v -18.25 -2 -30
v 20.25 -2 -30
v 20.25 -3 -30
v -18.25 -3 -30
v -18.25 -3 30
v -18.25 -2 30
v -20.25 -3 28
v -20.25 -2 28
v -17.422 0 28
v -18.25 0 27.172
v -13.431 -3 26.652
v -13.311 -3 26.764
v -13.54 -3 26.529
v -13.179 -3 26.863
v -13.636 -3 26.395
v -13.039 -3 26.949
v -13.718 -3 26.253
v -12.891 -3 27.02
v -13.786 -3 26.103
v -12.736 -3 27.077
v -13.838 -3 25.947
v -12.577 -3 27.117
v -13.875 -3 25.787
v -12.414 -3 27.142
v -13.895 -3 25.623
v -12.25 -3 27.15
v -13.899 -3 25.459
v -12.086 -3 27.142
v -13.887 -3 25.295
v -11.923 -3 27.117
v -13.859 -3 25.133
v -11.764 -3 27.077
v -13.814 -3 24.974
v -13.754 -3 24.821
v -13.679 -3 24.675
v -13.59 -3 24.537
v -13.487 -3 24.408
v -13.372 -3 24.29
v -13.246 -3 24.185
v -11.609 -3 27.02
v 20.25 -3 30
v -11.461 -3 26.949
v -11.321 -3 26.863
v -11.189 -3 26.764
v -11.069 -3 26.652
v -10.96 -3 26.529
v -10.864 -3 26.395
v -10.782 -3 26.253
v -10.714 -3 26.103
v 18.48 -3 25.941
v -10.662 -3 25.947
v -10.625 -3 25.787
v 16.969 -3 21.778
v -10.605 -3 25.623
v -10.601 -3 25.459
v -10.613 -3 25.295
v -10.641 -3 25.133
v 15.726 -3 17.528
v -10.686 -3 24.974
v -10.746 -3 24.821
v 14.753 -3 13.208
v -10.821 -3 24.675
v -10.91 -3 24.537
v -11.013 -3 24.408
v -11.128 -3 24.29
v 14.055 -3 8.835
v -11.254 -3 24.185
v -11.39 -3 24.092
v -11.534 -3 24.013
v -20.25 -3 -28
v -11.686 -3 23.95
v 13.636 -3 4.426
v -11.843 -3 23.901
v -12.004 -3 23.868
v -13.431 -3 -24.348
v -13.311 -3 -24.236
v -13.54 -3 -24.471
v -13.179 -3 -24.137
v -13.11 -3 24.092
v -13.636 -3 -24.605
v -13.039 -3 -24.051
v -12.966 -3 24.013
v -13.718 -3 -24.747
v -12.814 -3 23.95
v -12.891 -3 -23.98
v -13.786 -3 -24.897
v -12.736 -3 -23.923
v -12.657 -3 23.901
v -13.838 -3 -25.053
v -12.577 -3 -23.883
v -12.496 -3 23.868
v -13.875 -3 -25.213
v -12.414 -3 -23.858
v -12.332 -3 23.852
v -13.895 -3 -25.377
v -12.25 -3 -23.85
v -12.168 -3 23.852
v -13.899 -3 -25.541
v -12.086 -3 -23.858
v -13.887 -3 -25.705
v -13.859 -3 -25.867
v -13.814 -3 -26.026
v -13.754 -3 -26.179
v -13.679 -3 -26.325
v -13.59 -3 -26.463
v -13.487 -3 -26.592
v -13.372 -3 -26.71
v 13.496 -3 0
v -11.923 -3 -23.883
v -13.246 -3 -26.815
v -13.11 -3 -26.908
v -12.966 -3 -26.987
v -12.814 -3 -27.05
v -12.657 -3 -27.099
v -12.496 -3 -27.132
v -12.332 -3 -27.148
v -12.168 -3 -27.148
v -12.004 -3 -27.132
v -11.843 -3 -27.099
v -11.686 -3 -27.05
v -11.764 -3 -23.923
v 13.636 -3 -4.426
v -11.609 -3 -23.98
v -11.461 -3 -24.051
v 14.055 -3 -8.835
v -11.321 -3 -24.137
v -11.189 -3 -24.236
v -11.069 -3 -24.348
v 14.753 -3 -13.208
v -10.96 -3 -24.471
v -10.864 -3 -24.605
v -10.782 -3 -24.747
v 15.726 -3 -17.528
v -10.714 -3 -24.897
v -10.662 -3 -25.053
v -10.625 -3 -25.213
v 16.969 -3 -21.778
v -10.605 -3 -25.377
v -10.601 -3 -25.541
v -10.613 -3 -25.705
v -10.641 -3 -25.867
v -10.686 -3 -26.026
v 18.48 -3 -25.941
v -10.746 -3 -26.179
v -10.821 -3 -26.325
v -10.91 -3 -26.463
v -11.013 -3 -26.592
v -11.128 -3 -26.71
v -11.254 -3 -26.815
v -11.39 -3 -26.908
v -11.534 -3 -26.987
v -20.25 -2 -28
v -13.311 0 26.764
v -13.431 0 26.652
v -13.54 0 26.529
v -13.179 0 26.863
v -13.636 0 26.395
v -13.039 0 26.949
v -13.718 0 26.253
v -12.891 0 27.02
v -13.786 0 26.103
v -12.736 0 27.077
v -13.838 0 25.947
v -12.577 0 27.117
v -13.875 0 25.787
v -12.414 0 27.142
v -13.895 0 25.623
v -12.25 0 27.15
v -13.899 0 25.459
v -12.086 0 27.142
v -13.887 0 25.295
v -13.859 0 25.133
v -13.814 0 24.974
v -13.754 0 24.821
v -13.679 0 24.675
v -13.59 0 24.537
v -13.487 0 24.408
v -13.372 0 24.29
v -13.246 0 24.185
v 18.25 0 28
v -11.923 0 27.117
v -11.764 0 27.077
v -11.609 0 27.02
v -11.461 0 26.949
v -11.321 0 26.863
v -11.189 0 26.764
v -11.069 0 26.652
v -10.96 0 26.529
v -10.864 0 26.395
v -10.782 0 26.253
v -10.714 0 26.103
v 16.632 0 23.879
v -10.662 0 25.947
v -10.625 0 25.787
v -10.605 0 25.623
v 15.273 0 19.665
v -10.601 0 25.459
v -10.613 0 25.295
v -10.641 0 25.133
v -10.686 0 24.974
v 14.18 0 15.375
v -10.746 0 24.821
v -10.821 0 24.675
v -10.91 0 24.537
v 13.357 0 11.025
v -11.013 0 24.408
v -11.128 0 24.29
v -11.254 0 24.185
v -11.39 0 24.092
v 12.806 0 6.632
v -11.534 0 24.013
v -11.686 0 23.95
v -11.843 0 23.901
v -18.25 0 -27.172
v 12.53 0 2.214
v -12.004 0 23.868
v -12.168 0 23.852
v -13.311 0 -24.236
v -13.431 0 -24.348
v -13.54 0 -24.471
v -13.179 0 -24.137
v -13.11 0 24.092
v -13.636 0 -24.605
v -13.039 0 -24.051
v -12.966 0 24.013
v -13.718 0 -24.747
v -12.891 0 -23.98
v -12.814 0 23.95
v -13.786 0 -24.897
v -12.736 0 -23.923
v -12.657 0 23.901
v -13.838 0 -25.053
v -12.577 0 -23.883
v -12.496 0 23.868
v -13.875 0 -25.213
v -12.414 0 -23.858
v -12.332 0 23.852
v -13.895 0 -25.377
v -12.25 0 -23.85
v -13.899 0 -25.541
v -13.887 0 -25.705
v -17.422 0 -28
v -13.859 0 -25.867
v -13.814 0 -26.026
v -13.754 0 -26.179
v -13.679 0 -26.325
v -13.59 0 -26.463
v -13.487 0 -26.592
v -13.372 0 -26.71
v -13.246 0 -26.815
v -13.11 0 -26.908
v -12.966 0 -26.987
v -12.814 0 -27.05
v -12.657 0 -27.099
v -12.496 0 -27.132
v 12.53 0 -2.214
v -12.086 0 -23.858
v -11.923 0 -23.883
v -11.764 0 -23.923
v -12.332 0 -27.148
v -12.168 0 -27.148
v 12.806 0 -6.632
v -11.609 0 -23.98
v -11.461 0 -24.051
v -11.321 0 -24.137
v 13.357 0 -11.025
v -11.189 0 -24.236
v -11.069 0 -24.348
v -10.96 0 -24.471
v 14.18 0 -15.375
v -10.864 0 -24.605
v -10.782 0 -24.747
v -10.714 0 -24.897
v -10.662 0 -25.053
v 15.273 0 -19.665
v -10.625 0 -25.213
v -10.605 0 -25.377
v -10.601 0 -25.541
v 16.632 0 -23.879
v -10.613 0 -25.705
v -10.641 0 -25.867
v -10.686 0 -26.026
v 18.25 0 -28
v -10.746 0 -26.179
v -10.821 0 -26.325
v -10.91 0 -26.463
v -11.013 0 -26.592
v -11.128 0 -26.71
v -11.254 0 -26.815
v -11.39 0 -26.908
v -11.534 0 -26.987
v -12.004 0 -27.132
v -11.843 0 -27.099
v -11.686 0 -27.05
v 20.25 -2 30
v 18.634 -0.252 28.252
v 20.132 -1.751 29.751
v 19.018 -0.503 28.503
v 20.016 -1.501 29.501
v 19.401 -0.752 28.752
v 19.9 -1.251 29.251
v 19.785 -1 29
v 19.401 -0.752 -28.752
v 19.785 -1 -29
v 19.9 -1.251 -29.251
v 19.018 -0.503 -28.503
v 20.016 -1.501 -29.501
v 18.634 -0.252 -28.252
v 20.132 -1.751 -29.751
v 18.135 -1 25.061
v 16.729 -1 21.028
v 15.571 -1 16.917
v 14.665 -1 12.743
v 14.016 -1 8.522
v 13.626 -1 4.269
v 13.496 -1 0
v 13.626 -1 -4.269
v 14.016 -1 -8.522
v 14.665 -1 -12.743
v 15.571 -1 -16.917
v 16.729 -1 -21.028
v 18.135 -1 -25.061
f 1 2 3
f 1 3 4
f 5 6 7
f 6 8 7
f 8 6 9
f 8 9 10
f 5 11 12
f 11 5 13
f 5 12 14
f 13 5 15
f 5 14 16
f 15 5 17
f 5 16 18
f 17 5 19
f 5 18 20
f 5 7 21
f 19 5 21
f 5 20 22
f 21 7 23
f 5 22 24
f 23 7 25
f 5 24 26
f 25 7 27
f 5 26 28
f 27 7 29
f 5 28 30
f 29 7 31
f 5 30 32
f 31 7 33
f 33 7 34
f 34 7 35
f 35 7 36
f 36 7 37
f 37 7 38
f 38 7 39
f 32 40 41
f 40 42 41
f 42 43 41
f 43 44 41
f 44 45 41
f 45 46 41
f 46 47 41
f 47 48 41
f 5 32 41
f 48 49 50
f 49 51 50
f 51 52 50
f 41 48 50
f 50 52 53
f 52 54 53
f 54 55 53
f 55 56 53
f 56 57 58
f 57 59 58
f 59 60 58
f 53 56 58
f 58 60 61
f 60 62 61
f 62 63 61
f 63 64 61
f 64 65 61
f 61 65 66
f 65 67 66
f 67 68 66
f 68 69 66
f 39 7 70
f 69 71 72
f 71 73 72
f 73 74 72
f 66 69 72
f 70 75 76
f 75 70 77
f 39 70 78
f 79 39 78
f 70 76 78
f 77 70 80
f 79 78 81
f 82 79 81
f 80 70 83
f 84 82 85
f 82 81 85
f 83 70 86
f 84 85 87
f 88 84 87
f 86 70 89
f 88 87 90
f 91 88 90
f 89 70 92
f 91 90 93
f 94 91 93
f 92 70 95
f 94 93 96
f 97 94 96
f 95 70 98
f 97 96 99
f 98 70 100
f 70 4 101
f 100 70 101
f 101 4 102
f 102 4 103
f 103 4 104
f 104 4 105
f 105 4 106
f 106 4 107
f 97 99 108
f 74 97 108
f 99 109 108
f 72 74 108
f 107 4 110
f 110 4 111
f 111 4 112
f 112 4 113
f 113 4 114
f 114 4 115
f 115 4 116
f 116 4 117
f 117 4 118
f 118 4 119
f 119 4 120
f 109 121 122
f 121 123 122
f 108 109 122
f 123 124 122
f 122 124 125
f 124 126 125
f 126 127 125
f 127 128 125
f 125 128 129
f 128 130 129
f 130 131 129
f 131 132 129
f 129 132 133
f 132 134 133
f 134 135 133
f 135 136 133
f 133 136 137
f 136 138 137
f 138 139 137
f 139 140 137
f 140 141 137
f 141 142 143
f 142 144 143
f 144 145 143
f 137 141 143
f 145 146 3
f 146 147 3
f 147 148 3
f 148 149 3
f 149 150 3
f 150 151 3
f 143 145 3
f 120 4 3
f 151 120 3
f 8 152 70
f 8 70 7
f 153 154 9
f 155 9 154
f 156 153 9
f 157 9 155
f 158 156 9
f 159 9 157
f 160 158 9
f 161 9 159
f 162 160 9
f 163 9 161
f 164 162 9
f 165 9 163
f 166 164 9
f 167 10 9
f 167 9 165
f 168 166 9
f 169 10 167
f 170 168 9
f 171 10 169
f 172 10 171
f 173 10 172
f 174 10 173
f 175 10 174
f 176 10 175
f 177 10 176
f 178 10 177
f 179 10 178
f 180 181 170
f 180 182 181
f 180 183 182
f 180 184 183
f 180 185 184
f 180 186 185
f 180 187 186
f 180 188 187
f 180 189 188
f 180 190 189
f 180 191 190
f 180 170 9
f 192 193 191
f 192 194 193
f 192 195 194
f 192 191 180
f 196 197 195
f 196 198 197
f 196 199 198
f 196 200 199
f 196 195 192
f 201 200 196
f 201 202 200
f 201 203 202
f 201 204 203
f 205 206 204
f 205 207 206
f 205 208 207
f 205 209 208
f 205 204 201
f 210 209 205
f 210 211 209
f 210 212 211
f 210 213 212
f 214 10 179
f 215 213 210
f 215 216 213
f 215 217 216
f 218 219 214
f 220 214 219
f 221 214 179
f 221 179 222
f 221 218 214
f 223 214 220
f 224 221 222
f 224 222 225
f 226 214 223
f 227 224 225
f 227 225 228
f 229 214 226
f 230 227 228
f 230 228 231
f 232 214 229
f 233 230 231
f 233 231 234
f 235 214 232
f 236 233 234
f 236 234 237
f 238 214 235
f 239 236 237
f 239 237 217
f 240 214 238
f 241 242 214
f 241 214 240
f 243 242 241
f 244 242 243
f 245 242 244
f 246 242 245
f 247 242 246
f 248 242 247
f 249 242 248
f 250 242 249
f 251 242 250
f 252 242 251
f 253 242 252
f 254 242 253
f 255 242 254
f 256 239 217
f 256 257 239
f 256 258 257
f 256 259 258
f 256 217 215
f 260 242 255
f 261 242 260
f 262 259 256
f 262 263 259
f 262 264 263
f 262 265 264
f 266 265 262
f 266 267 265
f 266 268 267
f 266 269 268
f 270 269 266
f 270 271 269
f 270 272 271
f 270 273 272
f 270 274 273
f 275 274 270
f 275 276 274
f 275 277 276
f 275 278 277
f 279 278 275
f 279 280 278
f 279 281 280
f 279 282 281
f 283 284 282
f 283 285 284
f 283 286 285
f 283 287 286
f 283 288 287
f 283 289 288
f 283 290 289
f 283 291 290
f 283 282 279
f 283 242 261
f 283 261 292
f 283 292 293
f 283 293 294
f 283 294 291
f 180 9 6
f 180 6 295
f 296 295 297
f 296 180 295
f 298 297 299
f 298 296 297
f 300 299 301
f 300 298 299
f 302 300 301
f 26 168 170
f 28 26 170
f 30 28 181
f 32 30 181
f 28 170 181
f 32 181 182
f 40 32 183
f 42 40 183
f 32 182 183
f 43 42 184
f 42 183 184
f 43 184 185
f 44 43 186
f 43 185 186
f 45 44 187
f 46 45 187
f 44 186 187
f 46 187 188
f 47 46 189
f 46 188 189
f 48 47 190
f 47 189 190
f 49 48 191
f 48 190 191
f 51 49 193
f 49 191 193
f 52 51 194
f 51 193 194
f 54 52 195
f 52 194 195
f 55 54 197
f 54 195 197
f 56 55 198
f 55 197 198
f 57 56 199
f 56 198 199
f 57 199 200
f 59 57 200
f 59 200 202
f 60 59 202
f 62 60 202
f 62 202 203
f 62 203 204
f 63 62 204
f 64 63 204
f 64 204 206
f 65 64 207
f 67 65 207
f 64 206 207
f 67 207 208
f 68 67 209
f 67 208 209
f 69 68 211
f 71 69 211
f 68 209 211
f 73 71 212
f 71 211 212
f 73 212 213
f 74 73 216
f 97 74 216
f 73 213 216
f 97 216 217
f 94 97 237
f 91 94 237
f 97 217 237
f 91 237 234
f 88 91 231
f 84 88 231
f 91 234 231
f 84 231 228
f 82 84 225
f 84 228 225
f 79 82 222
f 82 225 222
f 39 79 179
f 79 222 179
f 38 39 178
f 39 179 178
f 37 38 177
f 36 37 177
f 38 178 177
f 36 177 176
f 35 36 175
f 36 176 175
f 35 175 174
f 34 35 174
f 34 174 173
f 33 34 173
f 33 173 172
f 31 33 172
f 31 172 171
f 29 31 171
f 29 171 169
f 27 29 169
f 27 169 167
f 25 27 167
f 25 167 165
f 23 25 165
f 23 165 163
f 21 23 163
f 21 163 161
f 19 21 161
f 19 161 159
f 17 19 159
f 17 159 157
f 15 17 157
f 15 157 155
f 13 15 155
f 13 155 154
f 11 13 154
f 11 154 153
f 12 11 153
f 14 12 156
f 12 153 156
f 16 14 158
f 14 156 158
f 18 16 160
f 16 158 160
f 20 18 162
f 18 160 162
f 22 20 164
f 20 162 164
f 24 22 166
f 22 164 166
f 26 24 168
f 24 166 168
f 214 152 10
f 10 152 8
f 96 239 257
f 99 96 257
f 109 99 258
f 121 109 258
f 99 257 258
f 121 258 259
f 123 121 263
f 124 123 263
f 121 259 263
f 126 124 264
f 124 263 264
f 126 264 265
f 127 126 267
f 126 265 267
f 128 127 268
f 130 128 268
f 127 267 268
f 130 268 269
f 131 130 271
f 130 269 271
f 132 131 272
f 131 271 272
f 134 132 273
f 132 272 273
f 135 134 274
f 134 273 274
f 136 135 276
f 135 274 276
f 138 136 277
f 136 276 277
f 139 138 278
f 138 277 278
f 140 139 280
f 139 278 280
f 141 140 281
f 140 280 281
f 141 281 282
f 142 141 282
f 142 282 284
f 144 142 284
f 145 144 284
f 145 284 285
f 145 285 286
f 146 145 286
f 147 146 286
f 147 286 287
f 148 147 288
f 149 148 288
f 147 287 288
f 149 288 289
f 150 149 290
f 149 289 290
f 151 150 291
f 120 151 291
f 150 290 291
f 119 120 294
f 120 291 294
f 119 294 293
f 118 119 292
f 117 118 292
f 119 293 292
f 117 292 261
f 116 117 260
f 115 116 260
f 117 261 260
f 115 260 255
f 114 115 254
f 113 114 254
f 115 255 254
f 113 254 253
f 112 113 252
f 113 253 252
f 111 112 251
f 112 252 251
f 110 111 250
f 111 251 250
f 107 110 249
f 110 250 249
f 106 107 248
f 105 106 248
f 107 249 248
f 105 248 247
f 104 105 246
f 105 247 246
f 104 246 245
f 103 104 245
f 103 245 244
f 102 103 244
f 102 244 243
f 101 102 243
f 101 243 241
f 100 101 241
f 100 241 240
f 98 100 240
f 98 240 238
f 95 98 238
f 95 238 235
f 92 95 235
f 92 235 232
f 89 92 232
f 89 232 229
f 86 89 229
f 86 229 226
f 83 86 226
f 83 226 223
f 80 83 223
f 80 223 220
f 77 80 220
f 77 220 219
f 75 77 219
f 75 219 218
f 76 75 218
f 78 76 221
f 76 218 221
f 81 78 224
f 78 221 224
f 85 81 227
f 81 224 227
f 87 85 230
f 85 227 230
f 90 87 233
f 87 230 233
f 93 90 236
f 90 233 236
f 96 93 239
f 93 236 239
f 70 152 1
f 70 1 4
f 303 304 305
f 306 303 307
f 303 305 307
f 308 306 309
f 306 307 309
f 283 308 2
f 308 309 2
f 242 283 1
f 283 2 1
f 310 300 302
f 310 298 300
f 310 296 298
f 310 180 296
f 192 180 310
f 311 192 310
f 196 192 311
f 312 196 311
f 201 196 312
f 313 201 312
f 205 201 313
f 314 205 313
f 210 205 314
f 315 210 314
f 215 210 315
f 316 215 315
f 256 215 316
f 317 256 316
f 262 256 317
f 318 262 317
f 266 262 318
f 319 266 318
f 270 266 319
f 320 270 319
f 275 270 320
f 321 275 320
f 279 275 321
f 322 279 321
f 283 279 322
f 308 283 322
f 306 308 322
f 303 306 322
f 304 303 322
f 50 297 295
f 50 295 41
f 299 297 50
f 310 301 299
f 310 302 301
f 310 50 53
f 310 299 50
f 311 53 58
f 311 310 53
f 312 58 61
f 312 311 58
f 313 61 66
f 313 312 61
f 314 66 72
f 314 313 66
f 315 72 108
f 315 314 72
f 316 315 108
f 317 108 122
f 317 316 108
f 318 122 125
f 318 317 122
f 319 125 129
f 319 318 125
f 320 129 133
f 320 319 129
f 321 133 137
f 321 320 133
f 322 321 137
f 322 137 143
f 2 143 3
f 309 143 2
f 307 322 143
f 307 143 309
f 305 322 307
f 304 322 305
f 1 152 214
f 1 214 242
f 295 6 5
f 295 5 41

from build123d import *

# Parameters (mm, degrees)
ESQUISSE1_R        = 1.65
BOSS_EXTRU_1_DEPTH = 3
CHANFREIN1_SIZE    = 2
CHANFREIN3_SIZE    = 2
CHANFREIN4_SIZE    = 1


with BuildPart() as part:
    # Esquisse1 → Boss.-Extru.1 (new body)
    with BuildSketch(Plane(origin=(0, 0, 0), x_dir=(1, 0, 0), z_dir=(0, 1, 0))):
        with BuildLine():
            Line((-20.25, -30), (20.25, -30))
            ThreePointArc((20.25, -30), (13.495553203, 0), (20.25, 30))
            Line((20.25, 30), (-20.25, 30))
            Line((-20.25, 30), (-20.25, -30))
        make_face()
        with Locations(Location((-12.25, -25.5, 0), (0, 0, 270))):
            Circle(ESQUISSE1_R, mode=Mode.SUBTRACT)
        with Locations(Location((-12.25, 25.5, 0), (0, 0, 270))):
            Circle(ESQUISSE1_R, mode=Mode.SUBTRACT)
    extrude(amount=-BOSS_EXTRU_1_DEPTH)

    # Chanfrein1
    chanfrein1_edges = [part.edges().sort_by_distance(p)[0] for p in [
        (-20.25, -1.5, 30),
        (-20.25, -1.5, -30),
    ]]
    chamfer(chanfrein1_edges, length=CHANFREIN1_SIZE)

    # Chanfrein3
    chanfrein3_edges = [part.edges().sort_by_distance(p)[0] for p in [
        (-20.25, 0, 0),
        (1, 0, 30),
        (-19.25, 0, -29),
        (-19.25, 0, 29),
        (1, 0, -30),
    ]]
    chamfer(chanfrein3_edges, length=CHANFREIN3_SIZE)

    # Chanfrein4
    chanfrein4_edges = [part.edges().sort_by_distance(p)[0] for p in [
        (13.495553203, 0, 0),
    ]]
    chamfer(chanfrein4_edges, length=CHANFREIN4_SIZE)


solid = part.part
